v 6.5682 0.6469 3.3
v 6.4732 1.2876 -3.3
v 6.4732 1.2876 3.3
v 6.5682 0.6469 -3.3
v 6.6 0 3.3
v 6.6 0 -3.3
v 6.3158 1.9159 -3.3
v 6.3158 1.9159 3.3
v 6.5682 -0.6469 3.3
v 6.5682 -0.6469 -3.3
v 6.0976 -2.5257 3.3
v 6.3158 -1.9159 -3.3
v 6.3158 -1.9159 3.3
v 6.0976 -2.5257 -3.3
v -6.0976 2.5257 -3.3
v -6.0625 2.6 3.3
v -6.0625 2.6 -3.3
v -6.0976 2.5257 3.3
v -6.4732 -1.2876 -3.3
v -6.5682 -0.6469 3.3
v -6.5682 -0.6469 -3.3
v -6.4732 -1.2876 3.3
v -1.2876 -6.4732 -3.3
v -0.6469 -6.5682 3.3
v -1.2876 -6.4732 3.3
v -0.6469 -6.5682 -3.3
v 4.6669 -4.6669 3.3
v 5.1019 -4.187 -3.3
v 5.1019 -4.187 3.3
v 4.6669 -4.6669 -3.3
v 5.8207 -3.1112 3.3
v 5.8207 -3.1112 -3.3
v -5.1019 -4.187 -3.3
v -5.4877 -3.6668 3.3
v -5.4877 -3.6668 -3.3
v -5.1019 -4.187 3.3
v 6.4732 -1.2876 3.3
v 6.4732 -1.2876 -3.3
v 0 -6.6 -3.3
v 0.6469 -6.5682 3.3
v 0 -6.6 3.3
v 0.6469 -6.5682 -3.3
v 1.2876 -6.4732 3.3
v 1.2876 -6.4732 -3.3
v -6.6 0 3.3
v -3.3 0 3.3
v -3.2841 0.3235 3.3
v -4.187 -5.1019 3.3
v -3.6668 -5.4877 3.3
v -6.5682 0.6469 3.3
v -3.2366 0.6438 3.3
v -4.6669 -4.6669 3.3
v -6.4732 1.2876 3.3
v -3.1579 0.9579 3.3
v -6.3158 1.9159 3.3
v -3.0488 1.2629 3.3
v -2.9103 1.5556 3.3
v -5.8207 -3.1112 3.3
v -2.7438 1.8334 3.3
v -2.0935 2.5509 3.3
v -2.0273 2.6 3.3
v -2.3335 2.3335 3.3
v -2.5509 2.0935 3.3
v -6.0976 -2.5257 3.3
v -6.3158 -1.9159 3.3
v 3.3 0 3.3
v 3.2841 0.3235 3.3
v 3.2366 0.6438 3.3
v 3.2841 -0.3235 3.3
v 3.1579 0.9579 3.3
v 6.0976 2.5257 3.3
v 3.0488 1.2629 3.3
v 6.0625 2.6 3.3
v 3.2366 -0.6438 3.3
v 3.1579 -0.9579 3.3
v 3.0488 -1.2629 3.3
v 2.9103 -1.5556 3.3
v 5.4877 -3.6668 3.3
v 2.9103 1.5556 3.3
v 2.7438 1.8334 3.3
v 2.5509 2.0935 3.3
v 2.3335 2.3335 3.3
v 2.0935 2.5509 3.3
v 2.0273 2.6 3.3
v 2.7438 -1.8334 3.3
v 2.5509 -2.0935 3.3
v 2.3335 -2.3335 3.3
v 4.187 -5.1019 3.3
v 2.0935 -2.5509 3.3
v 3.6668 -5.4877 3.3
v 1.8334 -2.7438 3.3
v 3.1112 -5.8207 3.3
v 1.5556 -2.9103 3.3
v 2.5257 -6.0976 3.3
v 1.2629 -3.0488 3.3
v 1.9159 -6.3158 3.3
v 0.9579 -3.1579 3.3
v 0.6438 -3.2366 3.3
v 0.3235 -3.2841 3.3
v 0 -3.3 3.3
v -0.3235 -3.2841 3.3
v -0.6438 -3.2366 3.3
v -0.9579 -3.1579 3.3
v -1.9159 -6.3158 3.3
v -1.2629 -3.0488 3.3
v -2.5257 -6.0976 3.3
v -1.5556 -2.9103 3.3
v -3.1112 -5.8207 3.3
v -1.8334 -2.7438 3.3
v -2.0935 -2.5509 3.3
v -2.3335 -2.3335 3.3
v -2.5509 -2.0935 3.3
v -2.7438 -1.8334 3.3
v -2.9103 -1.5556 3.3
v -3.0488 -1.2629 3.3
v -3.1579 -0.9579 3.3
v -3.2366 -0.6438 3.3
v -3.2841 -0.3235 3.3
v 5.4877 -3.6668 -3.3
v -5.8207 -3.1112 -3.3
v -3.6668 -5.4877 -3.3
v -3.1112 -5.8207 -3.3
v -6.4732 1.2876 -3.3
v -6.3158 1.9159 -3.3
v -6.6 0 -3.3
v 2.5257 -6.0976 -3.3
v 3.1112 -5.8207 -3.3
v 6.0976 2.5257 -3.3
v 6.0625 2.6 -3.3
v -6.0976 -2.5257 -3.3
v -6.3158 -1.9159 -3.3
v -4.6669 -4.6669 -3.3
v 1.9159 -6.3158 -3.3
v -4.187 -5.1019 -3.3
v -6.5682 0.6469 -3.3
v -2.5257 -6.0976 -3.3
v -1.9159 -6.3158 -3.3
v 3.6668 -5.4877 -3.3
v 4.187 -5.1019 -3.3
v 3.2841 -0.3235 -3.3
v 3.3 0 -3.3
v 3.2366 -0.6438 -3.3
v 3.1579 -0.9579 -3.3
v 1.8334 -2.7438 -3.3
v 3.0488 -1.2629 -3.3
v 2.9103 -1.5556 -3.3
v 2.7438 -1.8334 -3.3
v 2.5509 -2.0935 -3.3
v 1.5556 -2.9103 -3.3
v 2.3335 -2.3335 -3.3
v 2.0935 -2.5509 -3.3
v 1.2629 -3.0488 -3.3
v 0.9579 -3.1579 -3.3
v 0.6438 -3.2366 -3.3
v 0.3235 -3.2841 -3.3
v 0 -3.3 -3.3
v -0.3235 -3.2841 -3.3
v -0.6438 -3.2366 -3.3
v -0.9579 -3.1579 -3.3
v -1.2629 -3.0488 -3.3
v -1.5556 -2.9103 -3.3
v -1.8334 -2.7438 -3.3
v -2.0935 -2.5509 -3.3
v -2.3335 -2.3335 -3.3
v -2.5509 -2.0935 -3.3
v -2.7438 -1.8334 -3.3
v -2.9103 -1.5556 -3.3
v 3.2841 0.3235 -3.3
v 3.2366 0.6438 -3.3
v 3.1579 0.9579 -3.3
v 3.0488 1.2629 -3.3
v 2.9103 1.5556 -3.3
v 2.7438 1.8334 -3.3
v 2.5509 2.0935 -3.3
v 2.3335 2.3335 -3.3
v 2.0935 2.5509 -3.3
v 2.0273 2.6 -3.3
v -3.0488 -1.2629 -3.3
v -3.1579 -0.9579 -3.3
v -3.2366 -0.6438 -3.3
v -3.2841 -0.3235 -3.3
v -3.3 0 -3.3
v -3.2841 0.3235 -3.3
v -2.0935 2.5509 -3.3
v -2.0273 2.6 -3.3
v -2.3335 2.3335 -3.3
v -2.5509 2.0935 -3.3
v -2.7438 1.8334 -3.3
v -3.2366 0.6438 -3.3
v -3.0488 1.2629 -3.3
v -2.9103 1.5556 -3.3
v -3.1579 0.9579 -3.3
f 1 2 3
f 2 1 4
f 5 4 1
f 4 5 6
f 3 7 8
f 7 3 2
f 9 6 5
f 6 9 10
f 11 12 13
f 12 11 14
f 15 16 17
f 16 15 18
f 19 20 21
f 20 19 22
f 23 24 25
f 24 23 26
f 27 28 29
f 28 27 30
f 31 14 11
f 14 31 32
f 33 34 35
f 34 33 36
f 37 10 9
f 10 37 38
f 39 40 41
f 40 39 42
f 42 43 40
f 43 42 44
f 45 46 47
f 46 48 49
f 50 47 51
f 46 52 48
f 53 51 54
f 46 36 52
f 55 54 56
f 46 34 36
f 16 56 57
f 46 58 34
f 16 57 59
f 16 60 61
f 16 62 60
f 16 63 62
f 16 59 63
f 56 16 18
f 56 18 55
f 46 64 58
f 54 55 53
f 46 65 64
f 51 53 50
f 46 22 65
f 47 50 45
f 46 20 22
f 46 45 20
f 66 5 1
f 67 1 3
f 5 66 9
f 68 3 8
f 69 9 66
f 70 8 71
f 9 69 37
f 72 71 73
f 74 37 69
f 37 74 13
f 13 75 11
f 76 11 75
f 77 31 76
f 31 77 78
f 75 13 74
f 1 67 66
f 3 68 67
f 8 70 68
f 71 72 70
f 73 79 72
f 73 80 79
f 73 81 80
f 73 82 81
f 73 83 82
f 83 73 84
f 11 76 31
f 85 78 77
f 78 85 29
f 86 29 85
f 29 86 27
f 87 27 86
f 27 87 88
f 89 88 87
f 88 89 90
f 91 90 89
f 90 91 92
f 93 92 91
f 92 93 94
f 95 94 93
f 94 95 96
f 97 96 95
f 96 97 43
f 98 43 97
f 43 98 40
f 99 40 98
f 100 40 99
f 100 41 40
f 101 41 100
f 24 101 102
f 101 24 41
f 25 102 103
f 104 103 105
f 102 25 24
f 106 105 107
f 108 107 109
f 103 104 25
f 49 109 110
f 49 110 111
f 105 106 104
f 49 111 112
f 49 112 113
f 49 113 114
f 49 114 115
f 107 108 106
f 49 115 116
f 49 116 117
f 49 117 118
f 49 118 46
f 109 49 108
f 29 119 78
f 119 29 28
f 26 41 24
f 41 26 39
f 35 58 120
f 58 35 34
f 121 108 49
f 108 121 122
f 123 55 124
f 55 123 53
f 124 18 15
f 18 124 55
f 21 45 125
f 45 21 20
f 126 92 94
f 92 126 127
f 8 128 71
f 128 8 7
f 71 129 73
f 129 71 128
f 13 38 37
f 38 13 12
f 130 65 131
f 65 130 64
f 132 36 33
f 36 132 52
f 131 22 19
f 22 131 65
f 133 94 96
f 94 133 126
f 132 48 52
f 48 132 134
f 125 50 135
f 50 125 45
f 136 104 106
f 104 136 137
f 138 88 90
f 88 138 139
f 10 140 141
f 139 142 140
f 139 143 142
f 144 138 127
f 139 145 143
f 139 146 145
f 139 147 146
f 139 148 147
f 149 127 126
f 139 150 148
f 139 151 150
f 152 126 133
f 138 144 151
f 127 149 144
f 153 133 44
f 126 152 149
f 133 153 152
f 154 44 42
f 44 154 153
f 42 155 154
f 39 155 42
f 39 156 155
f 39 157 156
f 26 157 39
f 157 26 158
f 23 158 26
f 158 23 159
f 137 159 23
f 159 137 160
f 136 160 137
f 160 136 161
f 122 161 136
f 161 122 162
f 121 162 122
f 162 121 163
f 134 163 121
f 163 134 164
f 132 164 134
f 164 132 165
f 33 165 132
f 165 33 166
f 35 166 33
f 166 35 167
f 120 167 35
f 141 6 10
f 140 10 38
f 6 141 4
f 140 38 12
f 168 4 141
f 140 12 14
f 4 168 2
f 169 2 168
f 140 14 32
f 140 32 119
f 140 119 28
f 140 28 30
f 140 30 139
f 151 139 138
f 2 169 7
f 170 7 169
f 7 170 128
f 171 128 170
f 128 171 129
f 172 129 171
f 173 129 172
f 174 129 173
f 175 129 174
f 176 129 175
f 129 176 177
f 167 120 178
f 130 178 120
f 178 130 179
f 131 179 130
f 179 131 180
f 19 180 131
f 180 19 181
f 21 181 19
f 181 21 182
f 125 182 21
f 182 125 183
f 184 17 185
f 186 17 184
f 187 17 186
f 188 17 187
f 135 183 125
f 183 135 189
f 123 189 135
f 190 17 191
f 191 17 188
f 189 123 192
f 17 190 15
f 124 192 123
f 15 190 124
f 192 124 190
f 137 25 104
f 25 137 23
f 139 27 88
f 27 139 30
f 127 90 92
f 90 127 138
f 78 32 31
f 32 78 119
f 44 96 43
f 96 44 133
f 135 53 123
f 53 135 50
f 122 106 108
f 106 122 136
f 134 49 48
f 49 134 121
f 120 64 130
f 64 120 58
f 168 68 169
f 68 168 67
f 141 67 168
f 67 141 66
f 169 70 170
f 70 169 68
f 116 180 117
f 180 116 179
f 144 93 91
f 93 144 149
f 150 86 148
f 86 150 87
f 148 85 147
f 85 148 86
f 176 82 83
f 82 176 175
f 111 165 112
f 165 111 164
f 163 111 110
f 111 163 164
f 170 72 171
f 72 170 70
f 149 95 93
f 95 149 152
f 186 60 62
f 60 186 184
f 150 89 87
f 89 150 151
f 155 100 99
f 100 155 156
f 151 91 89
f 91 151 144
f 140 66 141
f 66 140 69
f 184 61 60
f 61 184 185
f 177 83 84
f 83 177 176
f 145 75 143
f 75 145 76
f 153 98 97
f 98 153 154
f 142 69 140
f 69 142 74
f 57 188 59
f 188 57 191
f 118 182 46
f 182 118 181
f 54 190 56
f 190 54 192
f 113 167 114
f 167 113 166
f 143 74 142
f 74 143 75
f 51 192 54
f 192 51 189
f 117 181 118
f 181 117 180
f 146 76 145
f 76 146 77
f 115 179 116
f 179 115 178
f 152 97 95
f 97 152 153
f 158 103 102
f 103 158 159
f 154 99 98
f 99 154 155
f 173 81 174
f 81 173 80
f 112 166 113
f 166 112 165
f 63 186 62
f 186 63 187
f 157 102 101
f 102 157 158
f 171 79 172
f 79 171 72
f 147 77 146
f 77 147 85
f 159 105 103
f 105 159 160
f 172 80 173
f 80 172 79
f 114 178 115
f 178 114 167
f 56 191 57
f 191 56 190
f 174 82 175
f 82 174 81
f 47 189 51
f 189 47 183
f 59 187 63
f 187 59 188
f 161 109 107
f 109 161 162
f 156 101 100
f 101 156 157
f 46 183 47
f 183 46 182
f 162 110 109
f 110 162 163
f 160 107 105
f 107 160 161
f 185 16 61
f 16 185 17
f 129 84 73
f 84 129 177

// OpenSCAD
// COBRA Vertebra - T2 V8
// Height: 6.6000000000000005mm, OD: 13.200000000000001mm

$fn = 64;

difference() {
    // Outer cylinder
    cylinder(h=6.6000000000000005, d=13.200000000000001, center=true);
    
    // Inner channel
    cylinder(h=8.600000000000001, d=6.6000000000000005, center=true);

    // Solar panel cavity
    translate([0, 4.6000000000000005, 0])
    cube([50, 4, 30], center=true);

    // Pivot holes
    translate([0, 6.6000000000000005, 0.30000000000000027])
    rotate([90, 0, 0])
    cylinder(h=5.300000000000001, d=4, center=true);
    
    translate([0, 6.6000000000000005, -0.30000000000000027])
    rotate([90, 0, 0])
    cylinder(h=5.300000000000001, d=4, center=true);
}
